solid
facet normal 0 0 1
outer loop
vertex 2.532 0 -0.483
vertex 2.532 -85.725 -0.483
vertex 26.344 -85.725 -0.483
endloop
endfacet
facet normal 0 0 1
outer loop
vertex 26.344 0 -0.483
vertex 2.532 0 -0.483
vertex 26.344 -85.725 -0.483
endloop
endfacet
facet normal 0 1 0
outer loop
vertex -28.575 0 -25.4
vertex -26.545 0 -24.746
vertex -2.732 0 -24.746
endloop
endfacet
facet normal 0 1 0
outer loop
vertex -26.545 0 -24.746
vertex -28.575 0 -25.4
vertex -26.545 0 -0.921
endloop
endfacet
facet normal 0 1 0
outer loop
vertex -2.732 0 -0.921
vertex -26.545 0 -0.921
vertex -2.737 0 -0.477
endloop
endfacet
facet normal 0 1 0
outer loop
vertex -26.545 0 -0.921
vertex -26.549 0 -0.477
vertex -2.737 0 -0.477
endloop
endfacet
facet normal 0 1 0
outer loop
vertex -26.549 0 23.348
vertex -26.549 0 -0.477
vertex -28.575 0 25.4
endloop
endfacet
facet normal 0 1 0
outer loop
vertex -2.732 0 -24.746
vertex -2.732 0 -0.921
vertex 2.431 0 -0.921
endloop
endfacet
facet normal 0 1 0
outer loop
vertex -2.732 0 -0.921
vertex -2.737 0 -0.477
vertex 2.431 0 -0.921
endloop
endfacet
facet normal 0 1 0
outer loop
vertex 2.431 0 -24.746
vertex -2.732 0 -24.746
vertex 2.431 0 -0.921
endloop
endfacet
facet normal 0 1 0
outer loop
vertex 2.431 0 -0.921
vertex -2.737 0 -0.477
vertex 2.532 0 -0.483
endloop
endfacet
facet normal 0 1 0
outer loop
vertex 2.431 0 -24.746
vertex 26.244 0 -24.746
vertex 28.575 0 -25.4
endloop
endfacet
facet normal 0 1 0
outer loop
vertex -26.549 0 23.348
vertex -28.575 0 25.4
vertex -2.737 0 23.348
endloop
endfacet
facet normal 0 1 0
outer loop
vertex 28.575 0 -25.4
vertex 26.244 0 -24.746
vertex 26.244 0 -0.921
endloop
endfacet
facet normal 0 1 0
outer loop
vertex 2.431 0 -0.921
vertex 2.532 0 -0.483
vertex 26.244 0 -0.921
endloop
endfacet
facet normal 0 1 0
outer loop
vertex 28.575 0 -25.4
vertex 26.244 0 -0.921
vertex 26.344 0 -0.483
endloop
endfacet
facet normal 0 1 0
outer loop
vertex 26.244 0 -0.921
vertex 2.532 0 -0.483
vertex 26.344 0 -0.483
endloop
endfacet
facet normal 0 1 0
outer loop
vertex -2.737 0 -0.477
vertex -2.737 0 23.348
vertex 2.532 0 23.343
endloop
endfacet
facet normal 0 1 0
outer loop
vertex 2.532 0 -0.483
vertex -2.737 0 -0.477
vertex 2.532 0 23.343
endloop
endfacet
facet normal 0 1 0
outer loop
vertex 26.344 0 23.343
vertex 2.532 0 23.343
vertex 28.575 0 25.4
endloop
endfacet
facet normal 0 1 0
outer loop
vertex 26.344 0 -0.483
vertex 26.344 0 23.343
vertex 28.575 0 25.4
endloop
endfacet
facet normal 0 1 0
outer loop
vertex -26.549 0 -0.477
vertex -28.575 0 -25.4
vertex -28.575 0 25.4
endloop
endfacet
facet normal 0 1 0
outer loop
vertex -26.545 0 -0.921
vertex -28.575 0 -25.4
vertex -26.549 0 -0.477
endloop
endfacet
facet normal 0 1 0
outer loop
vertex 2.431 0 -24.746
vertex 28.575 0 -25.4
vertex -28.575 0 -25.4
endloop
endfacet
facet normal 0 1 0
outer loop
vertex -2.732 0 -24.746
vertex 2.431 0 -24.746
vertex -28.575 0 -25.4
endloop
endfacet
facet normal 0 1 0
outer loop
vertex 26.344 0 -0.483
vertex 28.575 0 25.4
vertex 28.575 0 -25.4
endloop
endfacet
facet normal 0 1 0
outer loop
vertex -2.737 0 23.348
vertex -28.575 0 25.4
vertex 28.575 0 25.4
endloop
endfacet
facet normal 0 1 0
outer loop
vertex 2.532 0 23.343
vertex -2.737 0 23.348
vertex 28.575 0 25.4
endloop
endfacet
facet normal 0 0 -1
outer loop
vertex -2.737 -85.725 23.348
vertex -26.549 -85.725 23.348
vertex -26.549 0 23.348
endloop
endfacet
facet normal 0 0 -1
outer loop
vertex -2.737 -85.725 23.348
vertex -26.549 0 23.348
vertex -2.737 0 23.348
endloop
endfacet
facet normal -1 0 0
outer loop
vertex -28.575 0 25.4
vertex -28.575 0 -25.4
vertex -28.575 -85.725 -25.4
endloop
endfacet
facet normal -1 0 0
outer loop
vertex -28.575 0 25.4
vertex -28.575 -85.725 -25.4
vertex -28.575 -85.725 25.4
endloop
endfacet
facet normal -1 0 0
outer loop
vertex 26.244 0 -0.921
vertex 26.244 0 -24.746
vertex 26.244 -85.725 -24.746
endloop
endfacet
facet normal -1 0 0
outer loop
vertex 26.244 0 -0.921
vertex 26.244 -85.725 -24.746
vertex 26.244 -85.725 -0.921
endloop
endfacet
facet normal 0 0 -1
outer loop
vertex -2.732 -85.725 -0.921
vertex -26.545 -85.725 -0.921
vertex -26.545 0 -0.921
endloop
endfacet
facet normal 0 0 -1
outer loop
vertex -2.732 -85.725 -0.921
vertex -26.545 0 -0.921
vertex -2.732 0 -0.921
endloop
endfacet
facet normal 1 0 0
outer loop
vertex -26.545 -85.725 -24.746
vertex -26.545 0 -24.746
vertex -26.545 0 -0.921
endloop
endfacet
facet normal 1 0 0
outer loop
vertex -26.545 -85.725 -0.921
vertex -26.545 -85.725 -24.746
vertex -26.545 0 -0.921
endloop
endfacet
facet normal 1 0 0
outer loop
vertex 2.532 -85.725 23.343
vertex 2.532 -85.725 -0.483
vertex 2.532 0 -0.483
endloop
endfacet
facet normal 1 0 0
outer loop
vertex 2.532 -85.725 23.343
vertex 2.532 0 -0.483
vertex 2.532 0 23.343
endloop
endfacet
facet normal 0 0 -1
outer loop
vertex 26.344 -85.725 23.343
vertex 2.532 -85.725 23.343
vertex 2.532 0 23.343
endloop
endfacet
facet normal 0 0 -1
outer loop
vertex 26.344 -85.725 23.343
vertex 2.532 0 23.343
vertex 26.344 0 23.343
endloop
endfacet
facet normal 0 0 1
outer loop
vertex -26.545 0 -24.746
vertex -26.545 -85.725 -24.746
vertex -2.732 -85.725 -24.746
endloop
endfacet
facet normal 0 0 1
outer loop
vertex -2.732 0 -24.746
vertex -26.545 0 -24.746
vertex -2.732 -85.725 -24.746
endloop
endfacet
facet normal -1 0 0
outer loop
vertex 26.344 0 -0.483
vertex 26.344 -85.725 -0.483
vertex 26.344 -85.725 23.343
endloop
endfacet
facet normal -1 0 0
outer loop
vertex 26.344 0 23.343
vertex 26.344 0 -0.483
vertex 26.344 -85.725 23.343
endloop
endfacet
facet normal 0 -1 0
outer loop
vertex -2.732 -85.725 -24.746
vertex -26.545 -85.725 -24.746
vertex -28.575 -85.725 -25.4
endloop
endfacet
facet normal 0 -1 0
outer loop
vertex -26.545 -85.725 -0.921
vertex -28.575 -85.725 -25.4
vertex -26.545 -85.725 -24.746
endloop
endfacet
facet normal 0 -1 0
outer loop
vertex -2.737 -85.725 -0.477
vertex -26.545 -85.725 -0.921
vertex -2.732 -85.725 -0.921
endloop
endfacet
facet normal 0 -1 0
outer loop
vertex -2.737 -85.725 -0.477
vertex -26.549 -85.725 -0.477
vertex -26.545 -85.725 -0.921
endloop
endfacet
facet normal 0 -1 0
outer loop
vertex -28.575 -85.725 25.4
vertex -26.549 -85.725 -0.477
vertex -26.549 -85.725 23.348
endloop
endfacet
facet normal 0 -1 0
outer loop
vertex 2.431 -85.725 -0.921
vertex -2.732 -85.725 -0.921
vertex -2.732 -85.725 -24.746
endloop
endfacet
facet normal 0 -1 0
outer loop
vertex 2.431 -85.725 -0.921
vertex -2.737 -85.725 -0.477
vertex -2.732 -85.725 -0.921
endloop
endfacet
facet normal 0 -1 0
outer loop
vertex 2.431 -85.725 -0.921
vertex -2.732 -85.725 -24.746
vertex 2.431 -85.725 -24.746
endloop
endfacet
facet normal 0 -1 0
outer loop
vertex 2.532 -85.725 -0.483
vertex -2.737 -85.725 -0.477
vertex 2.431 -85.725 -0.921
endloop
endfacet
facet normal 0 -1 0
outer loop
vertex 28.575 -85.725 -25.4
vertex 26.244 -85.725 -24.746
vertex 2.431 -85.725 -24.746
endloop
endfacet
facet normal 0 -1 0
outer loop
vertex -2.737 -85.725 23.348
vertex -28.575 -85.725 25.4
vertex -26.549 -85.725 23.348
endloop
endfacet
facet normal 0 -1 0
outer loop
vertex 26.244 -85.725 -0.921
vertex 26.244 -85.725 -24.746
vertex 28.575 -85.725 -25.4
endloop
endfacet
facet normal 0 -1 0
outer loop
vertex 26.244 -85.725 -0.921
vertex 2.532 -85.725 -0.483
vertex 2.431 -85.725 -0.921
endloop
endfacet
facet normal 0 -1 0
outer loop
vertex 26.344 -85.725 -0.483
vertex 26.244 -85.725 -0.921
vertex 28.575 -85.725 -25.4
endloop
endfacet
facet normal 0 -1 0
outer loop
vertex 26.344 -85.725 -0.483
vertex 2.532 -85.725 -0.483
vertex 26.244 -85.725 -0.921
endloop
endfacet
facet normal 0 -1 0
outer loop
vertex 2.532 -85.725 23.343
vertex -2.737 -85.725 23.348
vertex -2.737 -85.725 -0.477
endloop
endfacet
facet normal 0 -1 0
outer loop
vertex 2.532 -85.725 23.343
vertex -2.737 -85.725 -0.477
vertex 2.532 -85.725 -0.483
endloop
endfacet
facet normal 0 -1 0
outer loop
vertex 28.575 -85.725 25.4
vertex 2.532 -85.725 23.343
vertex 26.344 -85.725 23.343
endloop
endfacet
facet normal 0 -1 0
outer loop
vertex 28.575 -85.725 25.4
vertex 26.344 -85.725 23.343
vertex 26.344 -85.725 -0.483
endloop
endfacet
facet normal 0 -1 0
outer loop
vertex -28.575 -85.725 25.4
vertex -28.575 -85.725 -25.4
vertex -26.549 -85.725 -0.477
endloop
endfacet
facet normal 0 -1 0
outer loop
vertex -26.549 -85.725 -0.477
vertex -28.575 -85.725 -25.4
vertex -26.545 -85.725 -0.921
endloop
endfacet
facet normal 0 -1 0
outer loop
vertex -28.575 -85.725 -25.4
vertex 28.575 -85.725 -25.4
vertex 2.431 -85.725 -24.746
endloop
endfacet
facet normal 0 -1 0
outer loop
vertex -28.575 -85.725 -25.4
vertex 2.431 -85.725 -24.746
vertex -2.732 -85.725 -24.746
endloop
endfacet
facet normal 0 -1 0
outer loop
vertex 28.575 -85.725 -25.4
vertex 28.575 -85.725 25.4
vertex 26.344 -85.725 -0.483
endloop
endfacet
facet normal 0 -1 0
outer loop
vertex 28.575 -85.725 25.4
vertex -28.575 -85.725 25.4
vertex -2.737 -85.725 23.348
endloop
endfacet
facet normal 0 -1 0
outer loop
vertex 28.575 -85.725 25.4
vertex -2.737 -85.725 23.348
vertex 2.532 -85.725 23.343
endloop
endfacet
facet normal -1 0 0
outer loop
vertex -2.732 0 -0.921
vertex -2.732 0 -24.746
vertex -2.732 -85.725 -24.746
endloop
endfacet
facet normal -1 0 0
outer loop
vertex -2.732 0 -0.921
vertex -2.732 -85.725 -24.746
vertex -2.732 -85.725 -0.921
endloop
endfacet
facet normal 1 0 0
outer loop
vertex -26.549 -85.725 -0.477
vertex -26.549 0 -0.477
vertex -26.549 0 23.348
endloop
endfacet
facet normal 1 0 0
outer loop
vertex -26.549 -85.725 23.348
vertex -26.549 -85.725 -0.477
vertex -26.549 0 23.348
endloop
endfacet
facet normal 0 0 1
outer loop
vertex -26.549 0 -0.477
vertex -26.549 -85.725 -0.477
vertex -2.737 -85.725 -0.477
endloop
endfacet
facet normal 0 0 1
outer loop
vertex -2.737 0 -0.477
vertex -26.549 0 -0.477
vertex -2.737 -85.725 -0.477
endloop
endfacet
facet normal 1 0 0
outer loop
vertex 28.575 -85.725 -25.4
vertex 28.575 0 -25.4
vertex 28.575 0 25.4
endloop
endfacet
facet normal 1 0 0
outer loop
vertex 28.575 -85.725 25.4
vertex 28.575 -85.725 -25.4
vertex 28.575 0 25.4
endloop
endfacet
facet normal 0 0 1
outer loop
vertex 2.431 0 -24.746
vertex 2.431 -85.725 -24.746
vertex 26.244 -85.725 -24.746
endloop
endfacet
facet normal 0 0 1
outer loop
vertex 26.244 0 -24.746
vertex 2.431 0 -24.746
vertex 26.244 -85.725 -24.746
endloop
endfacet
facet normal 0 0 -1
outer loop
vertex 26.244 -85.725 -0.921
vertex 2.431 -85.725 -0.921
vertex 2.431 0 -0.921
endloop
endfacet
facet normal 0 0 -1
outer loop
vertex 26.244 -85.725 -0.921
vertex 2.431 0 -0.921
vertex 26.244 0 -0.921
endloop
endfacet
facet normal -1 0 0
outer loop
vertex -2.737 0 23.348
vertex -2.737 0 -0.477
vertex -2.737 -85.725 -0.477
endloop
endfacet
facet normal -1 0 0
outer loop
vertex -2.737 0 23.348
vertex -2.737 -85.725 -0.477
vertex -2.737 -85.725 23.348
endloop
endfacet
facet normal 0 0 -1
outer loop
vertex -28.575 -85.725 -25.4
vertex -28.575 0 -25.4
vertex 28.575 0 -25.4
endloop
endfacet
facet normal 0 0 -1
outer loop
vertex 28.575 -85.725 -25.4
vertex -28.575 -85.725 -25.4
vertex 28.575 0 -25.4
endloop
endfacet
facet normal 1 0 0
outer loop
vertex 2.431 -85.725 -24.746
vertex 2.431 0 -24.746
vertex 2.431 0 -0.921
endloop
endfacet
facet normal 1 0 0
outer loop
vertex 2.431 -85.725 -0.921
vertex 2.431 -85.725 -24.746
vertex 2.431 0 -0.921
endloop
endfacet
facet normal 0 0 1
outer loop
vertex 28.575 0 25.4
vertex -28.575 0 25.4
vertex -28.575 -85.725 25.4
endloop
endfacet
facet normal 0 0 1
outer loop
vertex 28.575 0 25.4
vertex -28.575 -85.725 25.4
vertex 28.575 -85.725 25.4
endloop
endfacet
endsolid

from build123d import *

# Parameters (mm, degrees)
F0_W     = 57.15
F0_H     = 50.8
F1_DEPTH = 85.725
F2_W     = 23.8125
F2_H     = 23.8252
F3_DEPTH = 85.726
F4_W     = 23.8125
F4_H     = 23.8252
F5_DEPTH = 85.726
F6_W     = 23.8125
F6_H     = 23.8252
F7_DEPTH = 85.726
F8_W     = 23.8125
F8_H     = 23.8252
F9_DEPTH = 85.726


with BuildPart() as f1:
    # F0 (on Front) → F1 (new body)
    with BuildSketch(Plane.XZ):
        Rectangle(F0_W, F0_H)
    extrude(amount=F1_DEPTH)

    # F2 (on face) → F3 (cut, through all)
    with BuildSketch(Plane.XZ.offset(85.725)):
        with Locations((-14.643011, 11.435687)):
            Rectangle(F2_W, F2_H)
    extrude(amount=-F3_DEPTH, mode=Mode.SUBTRACT)

    # F4 (on face) → F5 (cut, through all)
    with BuildSketch(Plane.XZ.offset(85.725)):
        with Locations((14.437895, 11.43)):
            Rectangle(F4_W, F4_H)
    extrude(amount=-F5_DEPTH, mode=Mode.SUBTRACT)

    # F6 (on face) → F7 (cut, through all)
    with BuildSketch(Plane.XZ.offset(85.725)):
        with Locations((-14.638421, -12.833685)):
            Rectangle(F6_W, F6_H)
    extrude(amount=-F7_DEPTH, mode=Mode.SUBTRACT)

    # F8 (on face) → F9 (cut, through all)
    with BuildSketch(Plane.XZ.offset(85.725)):
        with Locations((14.337632, -12.833685)):
            Rectangle(F8_W, F8_H)
    extrude(amount=-F9_DEPTH, mode=Mode.SUBTRACT)


solid = f1.part
